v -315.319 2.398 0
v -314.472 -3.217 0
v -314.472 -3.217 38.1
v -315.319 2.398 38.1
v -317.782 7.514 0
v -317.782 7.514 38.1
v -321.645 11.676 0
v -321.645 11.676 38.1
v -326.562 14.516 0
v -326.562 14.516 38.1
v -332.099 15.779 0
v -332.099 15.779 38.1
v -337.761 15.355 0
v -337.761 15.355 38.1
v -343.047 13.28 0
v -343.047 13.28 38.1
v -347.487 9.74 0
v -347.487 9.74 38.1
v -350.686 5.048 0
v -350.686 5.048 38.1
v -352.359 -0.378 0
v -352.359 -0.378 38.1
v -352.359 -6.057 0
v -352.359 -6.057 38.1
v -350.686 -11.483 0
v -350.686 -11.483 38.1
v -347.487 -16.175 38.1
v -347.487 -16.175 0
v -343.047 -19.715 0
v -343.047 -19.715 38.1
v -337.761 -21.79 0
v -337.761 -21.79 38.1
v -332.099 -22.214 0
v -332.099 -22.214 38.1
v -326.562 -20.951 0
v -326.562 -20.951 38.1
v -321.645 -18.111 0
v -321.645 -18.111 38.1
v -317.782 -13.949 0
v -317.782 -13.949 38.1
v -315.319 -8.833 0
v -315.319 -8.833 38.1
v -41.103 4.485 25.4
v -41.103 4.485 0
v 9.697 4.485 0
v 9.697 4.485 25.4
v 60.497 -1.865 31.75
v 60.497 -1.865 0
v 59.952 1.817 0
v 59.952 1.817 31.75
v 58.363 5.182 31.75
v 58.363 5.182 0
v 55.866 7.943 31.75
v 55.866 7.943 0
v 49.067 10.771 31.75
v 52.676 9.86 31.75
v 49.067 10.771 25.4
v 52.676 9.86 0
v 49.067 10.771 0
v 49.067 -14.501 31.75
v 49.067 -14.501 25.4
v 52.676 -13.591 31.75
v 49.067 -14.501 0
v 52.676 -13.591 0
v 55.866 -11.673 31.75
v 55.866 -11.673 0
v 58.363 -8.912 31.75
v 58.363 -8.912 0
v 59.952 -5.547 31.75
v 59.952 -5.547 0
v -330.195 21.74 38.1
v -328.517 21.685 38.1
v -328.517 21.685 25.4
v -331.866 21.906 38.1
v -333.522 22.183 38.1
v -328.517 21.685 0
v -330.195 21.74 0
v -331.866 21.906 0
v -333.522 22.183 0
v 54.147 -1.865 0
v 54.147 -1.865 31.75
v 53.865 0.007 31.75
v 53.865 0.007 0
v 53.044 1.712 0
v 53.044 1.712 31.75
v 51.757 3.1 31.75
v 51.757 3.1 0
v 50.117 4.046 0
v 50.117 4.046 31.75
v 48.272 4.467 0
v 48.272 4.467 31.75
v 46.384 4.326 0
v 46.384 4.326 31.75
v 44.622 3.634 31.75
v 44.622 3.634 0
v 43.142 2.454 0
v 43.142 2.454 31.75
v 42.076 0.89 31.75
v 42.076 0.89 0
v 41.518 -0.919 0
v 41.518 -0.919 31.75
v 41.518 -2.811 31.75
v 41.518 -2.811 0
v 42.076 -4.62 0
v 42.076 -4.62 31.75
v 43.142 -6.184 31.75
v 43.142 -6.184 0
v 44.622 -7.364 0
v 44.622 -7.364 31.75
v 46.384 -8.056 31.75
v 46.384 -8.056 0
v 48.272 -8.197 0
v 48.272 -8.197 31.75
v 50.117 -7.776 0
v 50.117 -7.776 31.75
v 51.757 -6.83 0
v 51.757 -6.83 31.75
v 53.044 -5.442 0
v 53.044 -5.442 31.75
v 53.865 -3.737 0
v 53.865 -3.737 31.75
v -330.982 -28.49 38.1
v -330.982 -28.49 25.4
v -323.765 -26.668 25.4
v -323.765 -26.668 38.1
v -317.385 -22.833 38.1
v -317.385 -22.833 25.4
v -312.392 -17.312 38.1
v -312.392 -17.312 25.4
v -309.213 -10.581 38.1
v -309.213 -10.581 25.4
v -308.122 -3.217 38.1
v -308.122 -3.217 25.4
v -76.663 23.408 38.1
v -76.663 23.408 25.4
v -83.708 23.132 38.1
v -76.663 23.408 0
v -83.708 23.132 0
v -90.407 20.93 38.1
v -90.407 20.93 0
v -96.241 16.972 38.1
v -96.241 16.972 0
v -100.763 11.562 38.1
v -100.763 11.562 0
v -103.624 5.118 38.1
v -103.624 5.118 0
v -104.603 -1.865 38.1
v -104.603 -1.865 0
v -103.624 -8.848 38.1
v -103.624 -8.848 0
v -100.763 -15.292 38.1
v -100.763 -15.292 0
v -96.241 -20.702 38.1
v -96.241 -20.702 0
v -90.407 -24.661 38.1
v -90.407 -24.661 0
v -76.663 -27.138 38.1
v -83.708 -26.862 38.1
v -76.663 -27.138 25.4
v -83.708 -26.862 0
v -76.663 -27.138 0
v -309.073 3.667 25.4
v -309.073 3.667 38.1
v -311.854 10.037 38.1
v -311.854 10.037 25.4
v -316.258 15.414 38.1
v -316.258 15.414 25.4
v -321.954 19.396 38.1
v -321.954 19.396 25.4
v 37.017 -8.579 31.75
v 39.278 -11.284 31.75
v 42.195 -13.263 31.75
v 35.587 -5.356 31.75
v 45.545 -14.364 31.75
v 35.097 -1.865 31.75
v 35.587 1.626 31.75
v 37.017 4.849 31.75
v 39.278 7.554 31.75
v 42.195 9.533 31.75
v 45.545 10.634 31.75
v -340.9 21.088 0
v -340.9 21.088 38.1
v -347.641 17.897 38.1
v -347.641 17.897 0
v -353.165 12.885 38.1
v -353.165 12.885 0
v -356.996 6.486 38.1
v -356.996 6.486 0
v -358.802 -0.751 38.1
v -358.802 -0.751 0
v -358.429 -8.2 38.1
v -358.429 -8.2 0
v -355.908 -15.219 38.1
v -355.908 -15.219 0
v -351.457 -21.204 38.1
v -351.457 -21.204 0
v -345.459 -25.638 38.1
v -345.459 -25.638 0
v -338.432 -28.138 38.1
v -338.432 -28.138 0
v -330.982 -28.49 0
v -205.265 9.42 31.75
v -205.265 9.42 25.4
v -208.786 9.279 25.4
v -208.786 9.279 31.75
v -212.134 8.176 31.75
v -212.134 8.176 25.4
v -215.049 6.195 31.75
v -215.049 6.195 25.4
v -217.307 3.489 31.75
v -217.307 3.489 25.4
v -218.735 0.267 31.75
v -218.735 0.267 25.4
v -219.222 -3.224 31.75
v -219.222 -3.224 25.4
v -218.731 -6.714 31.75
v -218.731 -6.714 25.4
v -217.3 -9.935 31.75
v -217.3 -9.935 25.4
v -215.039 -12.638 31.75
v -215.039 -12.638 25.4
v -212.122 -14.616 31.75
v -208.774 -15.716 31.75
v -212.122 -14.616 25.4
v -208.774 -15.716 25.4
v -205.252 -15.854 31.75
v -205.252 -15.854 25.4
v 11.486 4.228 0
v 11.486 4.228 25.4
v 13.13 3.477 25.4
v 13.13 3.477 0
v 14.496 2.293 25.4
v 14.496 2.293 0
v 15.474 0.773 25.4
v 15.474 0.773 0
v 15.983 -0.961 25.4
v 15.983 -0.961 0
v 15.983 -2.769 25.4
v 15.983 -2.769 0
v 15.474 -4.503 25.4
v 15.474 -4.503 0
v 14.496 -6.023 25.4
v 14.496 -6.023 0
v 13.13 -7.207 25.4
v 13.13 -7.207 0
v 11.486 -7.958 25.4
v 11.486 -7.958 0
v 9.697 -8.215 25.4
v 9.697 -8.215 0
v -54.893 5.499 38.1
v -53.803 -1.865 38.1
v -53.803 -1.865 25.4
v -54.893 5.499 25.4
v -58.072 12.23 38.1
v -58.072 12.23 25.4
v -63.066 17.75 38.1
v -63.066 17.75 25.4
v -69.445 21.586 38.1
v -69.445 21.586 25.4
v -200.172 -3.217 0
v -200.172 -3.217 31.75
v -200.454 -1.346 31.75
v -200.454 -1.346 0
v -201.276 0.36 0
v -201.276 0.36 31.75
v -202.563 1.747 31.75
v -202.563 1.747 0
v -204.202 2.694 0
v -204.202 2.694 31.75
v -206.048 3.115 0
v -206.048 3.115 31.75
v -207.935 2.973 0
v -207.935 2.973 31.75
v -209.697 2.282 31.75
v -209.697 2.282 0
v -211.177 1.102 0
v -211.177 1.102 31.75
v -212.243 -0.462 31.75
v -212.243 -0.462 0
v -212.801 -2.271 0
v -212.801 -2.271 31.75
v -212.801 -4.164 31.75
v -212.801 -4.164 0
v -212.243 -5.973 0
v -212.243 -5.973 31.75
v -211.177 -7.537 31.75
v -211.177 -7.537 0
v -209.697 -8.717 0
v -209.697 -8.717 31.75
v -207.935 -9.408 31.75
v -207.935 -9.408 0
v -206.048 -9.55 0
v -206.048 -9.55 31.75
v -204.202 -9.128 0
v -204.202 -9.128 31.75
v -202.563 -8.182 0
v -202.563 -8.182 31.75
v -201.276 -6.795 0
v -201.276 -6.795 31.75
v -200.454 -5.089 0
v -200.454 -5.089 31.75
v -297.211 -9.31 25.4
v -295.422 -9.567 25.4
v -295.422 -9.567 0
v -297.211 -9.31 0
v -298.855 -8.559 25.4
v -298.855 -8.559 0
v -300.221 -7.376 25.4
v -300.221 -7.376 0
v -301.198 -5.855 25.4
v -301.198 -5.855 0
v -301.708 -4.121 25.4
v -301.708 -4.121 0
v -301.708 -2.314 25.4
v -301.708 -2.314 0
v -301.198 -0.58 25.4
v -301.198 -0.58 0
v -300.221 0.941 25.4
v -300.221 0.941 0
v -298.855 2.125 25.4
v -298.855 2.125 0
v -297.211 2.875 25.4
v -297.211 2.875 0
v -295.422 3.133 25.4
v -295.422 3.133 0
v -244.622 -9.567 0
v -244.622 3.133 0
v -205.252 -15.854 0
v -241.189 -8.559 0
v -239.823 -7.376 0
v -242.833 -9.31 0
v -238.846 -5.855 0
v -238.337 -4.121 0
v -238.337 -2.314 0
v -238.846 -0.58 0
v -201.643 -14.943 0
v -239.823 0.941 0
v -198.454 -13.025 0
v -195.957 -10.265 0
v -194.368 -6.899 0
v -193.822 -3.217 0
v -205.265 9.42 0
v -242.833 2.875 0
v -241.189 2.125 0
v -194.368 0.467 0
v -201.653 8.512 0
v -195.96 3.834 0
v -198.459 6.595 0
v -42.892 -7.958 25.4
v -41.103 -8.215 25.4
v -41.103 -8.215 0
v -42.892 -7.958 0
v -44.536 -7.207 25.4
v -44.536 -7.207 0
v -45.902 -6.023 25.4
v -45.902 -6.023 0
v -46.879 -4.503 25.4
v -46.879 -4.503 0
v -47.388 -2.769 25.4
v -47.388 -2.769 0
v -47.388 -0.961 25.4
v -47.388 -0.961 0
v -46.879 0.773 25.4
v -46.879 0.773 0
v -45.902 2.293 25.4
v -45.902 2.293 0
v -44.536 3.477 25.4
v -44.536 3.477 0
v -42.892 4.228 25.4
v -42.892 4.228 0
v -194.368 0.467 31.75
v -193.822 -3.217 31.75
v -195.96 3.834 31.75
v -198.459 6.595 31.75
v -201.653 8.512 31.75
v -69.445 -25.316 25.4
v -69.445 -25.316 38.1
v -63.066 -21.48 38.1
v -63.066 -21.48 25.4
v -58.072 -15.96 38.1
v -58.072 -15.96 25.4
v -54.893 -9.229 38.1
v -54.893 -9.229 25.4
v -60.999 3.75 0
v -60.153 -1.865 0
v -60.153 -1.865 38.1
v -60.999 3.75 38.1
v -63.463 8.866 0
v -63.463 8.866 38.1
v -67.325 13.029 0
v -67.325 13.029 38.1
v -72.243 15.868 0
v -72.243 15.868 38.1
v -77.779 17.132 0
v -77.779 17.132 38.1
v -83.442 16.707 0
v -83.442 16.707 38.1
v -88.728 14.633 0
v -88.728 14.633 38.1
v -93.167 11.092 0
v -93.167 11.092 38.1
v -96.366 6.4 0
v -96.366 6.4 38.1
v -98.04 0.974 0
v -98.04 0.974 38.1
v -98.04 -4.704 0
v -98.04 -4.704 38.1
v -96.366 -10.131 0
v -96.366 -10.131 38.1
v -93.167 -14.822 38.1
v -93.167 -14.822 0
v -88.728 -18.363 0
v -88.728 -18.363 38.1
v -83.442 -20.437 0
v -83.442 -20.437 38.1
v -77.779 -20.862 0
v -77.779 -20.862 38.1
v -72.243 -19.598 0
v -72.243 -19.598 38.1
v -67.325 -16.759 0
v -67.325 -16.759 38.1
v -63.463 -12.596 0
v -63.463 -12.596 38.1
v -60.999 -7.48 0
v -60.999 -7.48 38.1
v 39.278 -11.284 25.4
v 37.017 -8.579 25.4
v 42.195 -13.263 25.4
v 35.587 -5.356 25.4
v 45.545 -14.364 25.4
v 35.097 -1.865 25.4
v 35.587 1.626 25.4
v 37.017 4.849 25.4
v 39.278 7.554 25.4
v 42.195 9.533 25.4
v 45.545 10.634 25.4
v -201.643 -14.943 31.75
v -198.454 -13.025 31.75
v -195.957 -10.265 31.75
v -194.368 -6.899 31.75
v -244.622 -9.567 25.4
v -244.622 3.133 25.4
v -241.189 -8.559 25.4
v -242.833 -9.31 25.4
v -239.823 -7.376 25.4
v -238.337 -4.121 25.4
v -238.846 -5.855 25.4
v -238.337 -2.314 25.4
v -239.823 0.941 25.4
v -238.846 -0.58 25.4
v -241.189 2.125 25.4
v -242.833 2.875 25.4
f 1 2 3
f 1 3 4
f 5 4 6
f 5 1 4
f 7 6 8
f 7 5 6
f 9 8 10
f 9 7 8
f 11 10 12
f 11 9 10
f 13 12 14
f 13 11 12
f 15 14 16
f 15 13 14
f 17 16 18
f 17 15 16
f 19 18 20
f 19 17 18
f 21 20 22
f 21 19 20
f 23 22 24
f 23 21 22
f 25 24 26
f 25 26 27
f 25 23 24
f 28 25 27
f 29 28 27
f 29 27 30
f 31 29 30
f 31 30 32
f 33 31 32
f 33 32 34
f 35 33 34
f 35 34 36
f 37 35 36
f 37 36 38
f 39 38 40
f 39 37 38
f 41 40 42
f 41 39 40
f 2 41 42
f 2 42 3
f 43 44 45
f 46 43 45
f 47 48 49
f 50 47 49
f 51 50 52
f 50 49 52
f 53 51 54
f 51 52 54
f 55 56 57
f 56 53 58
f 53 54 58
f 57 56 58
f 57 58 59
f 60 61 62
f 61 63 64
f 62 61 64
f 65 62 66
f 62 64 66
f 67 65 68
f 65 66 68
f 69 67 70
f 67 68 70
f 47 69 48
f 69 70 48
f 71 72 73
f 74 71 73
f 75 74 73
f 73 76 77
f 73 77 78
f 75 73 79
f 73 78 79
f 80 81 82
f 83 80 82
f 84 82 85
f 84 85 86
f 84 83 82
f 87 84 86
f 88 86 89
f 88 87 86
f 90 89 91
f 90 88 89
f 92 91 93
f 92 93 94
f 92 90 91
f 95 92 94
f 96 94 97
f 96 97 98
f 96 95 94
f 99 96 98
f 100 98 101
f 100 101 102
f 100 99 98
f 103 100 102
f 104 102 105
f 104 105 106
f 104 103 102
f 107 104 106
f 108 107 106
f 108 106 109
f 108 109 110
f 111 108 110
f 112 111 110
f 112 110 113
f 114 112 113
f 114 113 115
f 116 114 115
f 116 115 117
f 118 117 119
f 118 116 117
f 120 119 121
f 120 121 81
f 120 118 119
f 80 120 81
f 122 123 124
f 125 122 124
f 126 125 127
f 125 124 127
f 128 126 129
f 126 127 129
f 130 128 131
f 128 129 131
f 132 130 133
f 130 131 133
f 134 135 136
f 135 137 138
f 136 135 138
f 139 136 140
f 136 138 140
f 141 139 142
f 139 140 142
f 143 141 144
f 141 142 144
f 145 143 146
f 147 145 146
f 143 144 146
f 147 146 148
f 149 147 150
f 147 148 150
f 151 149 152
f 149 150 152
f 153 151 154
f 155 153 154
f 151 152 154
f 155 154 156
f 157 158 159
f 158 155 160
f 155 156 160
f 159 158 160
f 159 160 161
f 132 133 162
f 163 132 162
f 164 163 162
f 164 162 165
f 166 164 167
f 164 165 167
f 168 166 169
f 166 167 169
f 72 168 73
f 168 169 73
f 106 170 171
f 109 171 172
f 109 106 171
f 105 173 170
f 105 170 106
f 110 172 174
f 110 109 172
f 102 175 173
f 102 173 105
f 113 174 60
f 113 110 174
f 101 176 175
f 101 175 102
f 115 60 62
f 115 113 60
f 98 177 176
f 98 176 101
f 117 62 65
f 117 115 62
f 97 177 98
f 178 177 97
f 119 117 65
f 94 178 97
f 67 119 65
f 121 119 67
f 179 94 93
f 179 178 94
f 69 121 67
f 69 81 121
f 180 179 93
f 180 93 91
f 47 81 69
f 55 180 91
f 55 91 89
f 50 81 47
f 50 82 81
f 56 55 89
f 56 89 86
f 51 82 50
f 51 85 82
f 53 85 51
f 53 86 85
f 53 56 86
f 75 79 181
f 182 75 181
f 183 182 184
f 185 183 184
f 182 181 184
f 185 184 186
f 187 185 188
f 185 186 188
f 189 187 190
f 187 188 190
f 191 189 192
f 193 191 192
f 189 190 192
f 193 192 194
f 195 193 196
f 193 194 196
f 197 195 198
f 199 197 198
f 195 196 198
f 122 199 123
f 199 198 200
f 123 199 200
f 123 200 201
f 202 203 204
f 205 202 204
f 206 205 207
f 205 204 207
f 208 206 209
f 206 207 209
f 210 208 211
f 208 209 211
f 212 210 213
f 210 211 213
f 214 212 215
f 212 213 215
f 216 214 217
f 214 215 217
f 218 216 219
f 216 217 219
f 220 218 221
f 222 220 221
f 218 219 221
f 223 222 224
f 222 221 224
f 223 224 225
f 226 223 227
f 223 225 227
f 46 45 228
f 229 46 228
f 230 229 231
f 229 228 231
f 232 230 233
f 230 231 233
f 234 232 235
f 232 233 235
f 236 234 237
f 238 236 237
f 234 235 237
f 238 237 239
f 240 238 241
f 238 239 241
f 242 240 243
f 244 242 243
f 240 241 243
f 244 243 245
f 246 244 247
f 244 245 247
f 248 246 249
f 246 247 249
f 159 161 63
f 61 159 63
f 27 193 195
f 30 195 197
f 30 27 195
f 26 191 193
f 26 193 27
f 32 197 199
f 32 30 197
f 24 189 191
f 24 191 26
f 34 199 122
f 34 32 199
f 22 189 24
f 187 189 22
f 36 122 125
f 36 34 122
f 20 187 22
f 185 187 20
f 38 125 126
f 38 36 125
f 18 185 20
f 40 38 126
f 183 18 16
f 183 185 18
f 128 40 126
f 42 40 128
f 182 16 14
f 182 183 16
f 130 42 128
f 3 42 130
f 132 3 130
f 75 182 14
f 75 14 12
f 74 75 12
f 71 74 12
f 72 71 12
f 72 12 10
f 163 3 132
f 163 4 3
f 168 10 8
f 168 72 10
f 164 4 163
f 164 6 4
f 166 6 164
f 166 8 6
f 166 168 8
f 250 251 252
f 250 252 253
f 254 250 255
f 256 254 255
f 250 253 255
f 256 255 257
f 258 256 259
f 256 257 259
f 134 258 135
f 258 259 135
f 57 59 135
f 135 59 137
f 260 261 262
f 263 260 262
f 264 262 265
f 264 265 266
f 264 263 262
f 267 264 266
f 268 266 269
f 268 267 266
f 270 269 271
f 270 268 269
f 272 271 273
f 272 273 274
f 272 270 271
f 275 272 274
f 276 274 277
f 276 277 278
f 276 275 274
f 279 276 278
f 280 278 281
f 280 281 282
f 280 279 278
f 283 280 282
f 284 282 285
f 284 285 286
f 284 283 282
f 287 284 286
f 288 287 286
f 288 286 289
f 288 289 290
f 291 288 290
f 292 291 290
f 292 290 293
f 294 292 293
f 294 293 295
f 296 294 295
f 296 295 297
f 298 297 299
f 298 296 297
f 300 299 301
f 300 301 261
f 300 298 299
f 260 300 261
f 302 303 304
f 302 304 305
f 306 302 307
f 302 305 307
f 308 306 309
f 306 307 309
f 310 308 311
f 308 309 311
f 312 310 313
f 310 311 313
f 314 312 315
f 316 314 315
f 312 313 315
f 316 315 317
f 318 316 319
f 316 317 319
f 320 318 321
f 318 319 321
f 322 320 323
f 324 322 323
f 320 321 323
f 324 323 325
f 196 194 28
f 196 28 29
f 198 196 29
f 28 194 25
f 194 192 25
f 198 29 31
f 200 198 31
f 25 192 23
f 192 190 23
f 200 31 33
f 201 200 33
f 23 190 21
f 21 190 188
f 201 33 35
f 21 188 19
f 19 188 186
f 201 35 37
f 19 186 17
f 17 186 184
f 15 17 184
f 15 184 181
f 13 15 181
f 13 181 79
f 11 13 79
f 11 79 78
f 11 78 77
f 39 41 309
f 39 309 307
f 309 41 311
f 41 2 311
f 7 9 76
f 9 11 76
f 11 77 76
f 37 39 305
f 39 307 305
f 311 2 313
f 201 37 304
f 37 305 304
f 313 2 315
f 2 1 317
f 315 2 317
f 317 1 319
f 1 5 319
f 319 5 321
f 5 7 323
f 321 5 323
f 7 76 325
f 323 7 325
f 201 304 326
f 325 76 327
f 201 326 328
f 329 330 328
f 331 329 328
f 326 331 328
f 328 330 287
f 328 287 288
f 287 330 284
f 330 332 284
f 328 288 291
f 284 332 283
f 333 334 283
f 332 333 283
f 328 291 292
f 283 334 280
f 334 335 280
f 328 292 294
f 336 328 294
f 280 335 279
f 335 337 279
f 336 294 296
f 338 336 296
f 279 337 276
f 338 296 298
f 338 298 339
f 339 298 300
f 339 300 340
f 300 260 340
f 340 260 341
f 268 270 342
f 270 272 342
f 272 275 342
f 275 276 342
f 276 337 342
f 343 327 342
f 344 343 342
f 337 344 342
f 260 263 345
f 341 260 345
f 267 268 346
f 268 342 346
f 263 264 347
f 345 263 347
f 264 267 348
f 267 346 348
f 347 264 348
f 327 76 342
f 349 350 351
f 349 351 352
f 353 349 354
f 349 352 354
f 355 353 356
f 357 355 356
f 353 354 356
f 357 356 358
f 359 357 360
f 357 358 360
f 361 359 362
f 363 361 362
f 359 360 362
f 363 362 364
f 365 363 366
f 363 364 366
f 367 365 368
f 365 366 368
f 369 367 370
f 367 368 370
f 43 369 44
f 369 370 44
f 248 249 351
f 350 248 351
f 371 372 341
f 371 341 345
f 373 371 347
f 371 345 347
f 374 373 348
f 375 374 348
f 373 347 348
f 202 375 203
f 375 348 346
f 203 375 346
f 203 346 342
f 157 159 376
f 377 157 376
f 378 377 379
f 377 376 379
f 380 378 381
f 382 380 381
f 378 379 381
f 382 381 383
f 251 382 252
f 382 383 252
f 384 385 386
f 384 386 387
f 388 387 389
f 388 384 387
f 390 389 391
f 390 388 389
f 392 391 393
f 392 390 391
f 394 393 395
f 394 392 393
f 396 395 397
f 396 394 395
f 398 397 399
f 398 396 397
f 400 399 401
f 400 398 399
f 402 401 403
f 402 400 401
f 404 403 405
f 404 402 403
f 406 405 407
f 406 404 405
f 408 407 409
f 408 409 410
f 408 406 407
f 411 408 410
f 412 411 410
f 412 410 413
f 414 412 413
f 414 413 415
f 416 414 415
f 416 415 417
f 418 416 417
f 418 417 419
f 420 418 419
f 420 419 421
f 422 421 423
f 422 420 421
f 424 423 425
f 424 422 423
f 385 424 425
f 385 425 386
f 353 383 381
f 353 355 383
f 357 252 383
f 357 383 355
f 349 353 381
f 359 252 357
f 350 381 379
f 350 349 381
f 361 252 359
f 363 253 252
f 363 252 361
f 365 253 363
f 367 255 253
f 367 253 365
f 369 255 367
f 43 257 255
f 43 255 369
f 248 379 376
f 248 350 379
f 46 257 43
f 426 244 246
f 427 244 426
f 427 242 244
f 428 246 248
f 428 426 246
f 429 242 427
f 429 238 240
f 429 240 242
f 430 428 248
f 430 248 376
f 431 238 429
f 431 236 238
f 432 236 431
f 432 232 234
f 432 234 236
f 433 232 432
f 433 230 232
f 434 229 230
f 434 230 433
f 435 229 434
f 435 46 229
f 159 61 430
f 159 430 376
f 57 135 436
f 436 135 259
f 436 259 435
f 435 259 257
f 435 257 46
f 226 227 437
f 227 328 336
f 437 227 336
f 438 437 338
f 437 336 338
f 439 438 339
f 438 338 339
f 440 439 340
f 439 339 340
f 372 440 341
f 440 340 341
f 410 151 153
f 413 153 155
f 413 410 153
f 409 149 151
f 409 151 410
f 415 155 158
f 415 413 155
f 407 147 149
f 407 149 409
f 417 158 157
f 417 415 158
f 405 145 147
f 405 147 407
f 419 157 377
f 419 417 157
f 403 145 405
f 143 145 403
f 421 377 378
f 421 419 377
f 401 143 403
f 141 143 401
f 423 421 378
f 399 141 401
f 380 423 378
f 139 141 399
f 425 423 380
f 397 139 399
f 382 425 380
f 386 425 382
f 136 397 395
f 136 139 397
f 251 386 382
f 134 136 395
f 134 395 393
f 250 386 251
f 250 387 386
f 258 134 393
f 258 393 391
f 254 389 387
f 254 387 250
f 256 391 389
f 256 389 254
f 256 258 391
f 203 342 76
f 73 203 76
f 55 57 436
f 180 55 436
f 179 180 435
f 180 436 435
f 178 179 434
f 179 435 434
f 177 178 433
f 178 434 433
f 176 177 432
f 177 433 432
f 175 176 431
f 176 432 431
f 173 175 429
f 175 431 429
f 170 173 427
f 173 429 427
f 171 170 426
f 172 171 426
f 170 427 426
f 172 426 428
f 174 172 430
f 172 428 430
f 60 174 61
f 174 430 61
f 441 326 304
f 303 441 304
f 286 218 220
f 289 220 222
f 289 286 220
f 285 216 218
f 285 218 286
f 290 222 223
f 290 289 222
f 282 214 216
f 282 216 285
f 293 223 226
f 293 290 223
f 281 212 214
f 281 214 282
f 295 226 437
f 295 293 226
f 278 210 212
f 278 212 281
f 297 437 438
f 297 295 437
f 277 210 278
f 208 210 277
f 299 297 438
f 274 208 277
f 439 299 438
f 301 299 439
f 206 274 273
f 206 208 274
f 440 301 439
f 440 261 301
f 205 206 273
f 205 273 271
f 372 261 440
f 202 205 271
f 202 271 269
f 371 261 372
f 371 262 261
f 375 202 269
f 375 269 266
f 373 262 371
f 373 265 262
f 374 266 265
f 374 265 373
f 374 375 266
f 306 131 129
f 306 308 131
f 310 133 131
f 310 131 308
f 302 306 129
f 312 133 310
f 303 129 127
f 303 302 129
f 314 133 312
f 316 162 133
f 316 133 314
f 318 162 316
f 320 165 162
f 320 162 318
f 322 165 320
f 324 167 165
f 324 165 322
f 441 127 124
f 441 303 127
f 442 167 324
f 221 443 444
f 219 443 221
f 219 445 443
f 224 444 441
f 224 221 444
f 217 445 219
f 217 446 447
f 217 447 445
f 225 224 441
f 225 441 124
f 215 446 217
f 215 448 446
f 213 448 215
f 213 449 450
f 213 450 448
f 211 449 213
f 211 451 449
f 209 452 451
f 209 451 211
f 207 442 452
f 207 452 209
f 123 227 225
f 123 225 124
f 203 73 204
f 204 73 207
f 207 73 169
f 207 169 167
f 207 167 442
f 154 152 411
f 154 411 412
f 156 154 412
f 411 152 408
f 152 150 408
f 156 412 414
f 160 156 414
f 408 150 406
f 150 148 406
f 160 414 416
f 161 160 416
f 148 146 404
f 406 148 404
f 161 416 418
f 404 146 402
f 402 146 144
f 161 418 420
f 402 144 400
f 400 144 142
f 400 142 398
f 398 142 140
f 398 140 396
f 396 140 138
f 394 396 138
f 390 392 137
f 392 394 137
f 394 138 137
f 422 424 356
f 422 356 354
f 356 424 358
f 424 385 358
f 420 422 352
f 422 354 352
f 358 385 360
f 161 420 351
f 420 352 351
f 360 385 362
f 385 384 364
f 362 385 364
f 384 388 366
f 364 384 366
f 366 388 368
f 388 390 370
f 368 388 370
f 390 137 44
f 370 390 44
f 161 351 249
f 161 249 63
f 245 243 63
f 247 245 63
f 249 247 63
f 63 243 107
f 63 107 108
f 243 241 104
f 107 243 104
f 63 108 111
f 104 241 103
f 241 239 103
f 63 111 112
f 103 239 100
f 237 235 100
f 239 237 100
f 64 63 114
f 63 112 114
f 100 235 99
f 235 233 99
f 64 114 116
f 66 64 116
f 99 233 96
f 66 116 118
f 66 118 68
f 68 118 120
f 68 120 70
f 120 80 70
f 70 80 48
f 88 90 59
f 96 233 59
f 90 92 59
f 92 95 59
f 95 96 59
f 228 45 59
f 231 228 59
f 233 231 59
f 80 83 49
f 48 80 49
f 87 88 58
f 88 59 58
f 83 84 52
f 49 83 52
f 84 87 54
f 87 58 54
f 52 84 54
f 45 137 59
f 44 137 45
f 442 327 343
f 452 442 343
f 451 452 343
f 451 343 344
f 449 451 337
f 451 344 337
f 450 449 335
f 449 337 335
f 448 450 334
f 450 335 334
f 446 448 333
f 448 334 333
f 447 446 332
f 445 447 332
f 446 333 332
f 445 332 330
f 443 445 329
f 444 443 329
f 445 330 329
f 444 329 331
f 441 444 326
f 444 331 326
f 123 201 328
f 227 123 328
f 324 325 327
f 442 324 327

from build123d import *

# Parameters (mm, degrees)
F0_R     = 19.05
F1_DEPTH = 38.1
F2_DEPTH = 25.4
F0_R_2   = 6.35
F3_DEPTH = 31.75
F4_DEPTH = 38.1
F5_DEPTH = 25.4
F6_DEPTH = 31.75


with BuildPart() as f1:
    # F0 (on Top) → F1 (new body)
    with BuildSketch(Plane.XY):
        with BuildLine():
            ThreePointArc((-76.662651, -27.137716), (-60.365507, -18.903873), (-53.802651, -1.865035))
            ThreePointArc((-53.802651, -1.865035), (-60.365507, 15.173803), (-76.662651, 23.407646))
            ThreePointArc((-76.662651, 23.407646), (-104.602651, -1.865035), (-76.662651, -27.137716))
        make_face()
        with Locations((-79.202651, -1.865035)):
            Circle(F0_R, mode=Mode.SUBTRACT)
    extrude(amount=F1_DEPTH)

    # F0 (on Top) → F2 (join)
    with BuildSketch(Plane.XY):
        with BuildLine():
            ThreePointArc((-76.662651, 23.407646), (-60.365507, 15.173803), (-53.802651, -1.865035))
            ThreePointArc((-53.802651, -1.865035), (-60.365507, -18.903873), (-76.662651, -27.137716))
            Line((-76.662651, -27.137716), (49.067349, -14.501375))
            ThreePointArc((49.067349, -14.501375), (35.097349, -1.865035), (49.067349, 10.771306))
            Line((49.067349, 10.771306), (-76.662651, 23.407646))
        make_face()
        with BuildLine():
            ThreePointArc((-41.102651, -8.215035), (-47.452651, -1.865035), (-41.102651, 4.484965))
            Line((-41.102651, 4.484965), (9.697349, 4.484965))
            ThreePointArc((9.697349, 4.484965), (16.047349, -1.865035), (9.697349, -8.215035))
            Line((9.697349, -8.215035), (-41.102651, -8.215035))
        make_face(mode=Mode.SUBTRACT)
    extrude(amount=F2_DEPTH)

    # F0 (on Top) → F3 (join)
    with BuildSketch(Plane.XY):
        with BuildLine():
            ThreePointArc((60.497349, -1.865035), (57.215921, 6.654384), (49.067349, 10.771306))
            ThreePointArc((49.067349, 10.771306), (35.097349, -1.865035), (49.067349, -14.501375))
            ThreePointArc((49.067349, -14.501375), (57.215921, -10.384454), (60.497349, -1.865035))
        make_face()
        with Locations((47.797349, -1.865035)):
            Circle(F0_R_2, mode=Mode.SUBTRACT)
    extrude(amount=F3_DEPTH)


with BuildPart() as f4:
    # F0 (on Top) → F4 (new body)
    with BuildSketch(Plane.XY):
        with BuildLine():
            ThreePointArc((-328.516849, 21.684513), (-331.031884, 21.809336), (-333.522201, 22.182576))
            ThreePointArc((-333.522201, 22.182576), (-358.890351, -4.489018), (-330.982201, -28.490105))
            ThreePointArc((-330.982201, -28.490105), (-314.685056, -20.256262), (-308.122201, -3.217424))
            ThreePointArc((-308.122201, -3.217424), (-313.871553, 12.876427), (-328.516849, 21.684513))
        make_face()
        with Locations((-333.522201, -3.217424)):
            Circle(F0_R, mode=Mode.SUBTRACT)
    extrude(amount=F4_DEPTH)

    # F0 (on Top) → F5 (join)
    with BuildSketch(Plane.XY):
        with BuildLine():
            ThreePointArc((-308.122201, -3.217424), (-314.685056, -20.256262), (-330.982201, -28.490105))
            Line((-330.982201, -28.490105), (-205.252201, -15.853764))
            ThreePointArc((-205.252201, -15.853764), (-219.222199, -3.223696), (-205.264683, 9.420165))
            Line((-205.264683, 9.420165), (-328.516849, 21.684513))
            ThreePointArc((-328.516849, 21.684513), (-313.871553, 12.876427), (-308.122201, -3.217424))
        make_face()
        with BuildLine():
            ThreePointArc((-295.422201, -9.567424), (-301.772201, -3.217424), (-295.422201, 3.132576))
            Line((-295.422201, 3.132576), (-244.622201, 3.132576))
            ThreePointArc((-244.622201, 3.132576), (-238.272201, -3.217424), (-244.622201, -9.567424))
            Line((-244.622201, -9.567424), (-295.422201, -9.567424))
        make_face(mode=Mode.SUBTRACT)
    extrude(amount=F5_DEPTH)

    # F0 (on Top) → F6 (join)
    with BuildSketch(Plane.XY):
        with BuildLine():
            ThreePointArc((-205.264683, 9.420165), (-219.222199, -3.223696), (-205.252201, -15.853764))
            ThreePointArc((-205.252201, -15.853764), (-197.103629, -11.736843), (-193.822201, -3.217424))
            ThreePointArc((-193.822201, -3.217424), (-197.107837, 5.306646), (-205.264683, 9.420165))
        make_face()
        with Locations((-206.522201, -3.217424)):
            Circle(F0_R_2, mode=Mode.SUBTRACT)
    extrude(amount=F6_DEPTH)


solid = Compound([f1.part, f4.part])
